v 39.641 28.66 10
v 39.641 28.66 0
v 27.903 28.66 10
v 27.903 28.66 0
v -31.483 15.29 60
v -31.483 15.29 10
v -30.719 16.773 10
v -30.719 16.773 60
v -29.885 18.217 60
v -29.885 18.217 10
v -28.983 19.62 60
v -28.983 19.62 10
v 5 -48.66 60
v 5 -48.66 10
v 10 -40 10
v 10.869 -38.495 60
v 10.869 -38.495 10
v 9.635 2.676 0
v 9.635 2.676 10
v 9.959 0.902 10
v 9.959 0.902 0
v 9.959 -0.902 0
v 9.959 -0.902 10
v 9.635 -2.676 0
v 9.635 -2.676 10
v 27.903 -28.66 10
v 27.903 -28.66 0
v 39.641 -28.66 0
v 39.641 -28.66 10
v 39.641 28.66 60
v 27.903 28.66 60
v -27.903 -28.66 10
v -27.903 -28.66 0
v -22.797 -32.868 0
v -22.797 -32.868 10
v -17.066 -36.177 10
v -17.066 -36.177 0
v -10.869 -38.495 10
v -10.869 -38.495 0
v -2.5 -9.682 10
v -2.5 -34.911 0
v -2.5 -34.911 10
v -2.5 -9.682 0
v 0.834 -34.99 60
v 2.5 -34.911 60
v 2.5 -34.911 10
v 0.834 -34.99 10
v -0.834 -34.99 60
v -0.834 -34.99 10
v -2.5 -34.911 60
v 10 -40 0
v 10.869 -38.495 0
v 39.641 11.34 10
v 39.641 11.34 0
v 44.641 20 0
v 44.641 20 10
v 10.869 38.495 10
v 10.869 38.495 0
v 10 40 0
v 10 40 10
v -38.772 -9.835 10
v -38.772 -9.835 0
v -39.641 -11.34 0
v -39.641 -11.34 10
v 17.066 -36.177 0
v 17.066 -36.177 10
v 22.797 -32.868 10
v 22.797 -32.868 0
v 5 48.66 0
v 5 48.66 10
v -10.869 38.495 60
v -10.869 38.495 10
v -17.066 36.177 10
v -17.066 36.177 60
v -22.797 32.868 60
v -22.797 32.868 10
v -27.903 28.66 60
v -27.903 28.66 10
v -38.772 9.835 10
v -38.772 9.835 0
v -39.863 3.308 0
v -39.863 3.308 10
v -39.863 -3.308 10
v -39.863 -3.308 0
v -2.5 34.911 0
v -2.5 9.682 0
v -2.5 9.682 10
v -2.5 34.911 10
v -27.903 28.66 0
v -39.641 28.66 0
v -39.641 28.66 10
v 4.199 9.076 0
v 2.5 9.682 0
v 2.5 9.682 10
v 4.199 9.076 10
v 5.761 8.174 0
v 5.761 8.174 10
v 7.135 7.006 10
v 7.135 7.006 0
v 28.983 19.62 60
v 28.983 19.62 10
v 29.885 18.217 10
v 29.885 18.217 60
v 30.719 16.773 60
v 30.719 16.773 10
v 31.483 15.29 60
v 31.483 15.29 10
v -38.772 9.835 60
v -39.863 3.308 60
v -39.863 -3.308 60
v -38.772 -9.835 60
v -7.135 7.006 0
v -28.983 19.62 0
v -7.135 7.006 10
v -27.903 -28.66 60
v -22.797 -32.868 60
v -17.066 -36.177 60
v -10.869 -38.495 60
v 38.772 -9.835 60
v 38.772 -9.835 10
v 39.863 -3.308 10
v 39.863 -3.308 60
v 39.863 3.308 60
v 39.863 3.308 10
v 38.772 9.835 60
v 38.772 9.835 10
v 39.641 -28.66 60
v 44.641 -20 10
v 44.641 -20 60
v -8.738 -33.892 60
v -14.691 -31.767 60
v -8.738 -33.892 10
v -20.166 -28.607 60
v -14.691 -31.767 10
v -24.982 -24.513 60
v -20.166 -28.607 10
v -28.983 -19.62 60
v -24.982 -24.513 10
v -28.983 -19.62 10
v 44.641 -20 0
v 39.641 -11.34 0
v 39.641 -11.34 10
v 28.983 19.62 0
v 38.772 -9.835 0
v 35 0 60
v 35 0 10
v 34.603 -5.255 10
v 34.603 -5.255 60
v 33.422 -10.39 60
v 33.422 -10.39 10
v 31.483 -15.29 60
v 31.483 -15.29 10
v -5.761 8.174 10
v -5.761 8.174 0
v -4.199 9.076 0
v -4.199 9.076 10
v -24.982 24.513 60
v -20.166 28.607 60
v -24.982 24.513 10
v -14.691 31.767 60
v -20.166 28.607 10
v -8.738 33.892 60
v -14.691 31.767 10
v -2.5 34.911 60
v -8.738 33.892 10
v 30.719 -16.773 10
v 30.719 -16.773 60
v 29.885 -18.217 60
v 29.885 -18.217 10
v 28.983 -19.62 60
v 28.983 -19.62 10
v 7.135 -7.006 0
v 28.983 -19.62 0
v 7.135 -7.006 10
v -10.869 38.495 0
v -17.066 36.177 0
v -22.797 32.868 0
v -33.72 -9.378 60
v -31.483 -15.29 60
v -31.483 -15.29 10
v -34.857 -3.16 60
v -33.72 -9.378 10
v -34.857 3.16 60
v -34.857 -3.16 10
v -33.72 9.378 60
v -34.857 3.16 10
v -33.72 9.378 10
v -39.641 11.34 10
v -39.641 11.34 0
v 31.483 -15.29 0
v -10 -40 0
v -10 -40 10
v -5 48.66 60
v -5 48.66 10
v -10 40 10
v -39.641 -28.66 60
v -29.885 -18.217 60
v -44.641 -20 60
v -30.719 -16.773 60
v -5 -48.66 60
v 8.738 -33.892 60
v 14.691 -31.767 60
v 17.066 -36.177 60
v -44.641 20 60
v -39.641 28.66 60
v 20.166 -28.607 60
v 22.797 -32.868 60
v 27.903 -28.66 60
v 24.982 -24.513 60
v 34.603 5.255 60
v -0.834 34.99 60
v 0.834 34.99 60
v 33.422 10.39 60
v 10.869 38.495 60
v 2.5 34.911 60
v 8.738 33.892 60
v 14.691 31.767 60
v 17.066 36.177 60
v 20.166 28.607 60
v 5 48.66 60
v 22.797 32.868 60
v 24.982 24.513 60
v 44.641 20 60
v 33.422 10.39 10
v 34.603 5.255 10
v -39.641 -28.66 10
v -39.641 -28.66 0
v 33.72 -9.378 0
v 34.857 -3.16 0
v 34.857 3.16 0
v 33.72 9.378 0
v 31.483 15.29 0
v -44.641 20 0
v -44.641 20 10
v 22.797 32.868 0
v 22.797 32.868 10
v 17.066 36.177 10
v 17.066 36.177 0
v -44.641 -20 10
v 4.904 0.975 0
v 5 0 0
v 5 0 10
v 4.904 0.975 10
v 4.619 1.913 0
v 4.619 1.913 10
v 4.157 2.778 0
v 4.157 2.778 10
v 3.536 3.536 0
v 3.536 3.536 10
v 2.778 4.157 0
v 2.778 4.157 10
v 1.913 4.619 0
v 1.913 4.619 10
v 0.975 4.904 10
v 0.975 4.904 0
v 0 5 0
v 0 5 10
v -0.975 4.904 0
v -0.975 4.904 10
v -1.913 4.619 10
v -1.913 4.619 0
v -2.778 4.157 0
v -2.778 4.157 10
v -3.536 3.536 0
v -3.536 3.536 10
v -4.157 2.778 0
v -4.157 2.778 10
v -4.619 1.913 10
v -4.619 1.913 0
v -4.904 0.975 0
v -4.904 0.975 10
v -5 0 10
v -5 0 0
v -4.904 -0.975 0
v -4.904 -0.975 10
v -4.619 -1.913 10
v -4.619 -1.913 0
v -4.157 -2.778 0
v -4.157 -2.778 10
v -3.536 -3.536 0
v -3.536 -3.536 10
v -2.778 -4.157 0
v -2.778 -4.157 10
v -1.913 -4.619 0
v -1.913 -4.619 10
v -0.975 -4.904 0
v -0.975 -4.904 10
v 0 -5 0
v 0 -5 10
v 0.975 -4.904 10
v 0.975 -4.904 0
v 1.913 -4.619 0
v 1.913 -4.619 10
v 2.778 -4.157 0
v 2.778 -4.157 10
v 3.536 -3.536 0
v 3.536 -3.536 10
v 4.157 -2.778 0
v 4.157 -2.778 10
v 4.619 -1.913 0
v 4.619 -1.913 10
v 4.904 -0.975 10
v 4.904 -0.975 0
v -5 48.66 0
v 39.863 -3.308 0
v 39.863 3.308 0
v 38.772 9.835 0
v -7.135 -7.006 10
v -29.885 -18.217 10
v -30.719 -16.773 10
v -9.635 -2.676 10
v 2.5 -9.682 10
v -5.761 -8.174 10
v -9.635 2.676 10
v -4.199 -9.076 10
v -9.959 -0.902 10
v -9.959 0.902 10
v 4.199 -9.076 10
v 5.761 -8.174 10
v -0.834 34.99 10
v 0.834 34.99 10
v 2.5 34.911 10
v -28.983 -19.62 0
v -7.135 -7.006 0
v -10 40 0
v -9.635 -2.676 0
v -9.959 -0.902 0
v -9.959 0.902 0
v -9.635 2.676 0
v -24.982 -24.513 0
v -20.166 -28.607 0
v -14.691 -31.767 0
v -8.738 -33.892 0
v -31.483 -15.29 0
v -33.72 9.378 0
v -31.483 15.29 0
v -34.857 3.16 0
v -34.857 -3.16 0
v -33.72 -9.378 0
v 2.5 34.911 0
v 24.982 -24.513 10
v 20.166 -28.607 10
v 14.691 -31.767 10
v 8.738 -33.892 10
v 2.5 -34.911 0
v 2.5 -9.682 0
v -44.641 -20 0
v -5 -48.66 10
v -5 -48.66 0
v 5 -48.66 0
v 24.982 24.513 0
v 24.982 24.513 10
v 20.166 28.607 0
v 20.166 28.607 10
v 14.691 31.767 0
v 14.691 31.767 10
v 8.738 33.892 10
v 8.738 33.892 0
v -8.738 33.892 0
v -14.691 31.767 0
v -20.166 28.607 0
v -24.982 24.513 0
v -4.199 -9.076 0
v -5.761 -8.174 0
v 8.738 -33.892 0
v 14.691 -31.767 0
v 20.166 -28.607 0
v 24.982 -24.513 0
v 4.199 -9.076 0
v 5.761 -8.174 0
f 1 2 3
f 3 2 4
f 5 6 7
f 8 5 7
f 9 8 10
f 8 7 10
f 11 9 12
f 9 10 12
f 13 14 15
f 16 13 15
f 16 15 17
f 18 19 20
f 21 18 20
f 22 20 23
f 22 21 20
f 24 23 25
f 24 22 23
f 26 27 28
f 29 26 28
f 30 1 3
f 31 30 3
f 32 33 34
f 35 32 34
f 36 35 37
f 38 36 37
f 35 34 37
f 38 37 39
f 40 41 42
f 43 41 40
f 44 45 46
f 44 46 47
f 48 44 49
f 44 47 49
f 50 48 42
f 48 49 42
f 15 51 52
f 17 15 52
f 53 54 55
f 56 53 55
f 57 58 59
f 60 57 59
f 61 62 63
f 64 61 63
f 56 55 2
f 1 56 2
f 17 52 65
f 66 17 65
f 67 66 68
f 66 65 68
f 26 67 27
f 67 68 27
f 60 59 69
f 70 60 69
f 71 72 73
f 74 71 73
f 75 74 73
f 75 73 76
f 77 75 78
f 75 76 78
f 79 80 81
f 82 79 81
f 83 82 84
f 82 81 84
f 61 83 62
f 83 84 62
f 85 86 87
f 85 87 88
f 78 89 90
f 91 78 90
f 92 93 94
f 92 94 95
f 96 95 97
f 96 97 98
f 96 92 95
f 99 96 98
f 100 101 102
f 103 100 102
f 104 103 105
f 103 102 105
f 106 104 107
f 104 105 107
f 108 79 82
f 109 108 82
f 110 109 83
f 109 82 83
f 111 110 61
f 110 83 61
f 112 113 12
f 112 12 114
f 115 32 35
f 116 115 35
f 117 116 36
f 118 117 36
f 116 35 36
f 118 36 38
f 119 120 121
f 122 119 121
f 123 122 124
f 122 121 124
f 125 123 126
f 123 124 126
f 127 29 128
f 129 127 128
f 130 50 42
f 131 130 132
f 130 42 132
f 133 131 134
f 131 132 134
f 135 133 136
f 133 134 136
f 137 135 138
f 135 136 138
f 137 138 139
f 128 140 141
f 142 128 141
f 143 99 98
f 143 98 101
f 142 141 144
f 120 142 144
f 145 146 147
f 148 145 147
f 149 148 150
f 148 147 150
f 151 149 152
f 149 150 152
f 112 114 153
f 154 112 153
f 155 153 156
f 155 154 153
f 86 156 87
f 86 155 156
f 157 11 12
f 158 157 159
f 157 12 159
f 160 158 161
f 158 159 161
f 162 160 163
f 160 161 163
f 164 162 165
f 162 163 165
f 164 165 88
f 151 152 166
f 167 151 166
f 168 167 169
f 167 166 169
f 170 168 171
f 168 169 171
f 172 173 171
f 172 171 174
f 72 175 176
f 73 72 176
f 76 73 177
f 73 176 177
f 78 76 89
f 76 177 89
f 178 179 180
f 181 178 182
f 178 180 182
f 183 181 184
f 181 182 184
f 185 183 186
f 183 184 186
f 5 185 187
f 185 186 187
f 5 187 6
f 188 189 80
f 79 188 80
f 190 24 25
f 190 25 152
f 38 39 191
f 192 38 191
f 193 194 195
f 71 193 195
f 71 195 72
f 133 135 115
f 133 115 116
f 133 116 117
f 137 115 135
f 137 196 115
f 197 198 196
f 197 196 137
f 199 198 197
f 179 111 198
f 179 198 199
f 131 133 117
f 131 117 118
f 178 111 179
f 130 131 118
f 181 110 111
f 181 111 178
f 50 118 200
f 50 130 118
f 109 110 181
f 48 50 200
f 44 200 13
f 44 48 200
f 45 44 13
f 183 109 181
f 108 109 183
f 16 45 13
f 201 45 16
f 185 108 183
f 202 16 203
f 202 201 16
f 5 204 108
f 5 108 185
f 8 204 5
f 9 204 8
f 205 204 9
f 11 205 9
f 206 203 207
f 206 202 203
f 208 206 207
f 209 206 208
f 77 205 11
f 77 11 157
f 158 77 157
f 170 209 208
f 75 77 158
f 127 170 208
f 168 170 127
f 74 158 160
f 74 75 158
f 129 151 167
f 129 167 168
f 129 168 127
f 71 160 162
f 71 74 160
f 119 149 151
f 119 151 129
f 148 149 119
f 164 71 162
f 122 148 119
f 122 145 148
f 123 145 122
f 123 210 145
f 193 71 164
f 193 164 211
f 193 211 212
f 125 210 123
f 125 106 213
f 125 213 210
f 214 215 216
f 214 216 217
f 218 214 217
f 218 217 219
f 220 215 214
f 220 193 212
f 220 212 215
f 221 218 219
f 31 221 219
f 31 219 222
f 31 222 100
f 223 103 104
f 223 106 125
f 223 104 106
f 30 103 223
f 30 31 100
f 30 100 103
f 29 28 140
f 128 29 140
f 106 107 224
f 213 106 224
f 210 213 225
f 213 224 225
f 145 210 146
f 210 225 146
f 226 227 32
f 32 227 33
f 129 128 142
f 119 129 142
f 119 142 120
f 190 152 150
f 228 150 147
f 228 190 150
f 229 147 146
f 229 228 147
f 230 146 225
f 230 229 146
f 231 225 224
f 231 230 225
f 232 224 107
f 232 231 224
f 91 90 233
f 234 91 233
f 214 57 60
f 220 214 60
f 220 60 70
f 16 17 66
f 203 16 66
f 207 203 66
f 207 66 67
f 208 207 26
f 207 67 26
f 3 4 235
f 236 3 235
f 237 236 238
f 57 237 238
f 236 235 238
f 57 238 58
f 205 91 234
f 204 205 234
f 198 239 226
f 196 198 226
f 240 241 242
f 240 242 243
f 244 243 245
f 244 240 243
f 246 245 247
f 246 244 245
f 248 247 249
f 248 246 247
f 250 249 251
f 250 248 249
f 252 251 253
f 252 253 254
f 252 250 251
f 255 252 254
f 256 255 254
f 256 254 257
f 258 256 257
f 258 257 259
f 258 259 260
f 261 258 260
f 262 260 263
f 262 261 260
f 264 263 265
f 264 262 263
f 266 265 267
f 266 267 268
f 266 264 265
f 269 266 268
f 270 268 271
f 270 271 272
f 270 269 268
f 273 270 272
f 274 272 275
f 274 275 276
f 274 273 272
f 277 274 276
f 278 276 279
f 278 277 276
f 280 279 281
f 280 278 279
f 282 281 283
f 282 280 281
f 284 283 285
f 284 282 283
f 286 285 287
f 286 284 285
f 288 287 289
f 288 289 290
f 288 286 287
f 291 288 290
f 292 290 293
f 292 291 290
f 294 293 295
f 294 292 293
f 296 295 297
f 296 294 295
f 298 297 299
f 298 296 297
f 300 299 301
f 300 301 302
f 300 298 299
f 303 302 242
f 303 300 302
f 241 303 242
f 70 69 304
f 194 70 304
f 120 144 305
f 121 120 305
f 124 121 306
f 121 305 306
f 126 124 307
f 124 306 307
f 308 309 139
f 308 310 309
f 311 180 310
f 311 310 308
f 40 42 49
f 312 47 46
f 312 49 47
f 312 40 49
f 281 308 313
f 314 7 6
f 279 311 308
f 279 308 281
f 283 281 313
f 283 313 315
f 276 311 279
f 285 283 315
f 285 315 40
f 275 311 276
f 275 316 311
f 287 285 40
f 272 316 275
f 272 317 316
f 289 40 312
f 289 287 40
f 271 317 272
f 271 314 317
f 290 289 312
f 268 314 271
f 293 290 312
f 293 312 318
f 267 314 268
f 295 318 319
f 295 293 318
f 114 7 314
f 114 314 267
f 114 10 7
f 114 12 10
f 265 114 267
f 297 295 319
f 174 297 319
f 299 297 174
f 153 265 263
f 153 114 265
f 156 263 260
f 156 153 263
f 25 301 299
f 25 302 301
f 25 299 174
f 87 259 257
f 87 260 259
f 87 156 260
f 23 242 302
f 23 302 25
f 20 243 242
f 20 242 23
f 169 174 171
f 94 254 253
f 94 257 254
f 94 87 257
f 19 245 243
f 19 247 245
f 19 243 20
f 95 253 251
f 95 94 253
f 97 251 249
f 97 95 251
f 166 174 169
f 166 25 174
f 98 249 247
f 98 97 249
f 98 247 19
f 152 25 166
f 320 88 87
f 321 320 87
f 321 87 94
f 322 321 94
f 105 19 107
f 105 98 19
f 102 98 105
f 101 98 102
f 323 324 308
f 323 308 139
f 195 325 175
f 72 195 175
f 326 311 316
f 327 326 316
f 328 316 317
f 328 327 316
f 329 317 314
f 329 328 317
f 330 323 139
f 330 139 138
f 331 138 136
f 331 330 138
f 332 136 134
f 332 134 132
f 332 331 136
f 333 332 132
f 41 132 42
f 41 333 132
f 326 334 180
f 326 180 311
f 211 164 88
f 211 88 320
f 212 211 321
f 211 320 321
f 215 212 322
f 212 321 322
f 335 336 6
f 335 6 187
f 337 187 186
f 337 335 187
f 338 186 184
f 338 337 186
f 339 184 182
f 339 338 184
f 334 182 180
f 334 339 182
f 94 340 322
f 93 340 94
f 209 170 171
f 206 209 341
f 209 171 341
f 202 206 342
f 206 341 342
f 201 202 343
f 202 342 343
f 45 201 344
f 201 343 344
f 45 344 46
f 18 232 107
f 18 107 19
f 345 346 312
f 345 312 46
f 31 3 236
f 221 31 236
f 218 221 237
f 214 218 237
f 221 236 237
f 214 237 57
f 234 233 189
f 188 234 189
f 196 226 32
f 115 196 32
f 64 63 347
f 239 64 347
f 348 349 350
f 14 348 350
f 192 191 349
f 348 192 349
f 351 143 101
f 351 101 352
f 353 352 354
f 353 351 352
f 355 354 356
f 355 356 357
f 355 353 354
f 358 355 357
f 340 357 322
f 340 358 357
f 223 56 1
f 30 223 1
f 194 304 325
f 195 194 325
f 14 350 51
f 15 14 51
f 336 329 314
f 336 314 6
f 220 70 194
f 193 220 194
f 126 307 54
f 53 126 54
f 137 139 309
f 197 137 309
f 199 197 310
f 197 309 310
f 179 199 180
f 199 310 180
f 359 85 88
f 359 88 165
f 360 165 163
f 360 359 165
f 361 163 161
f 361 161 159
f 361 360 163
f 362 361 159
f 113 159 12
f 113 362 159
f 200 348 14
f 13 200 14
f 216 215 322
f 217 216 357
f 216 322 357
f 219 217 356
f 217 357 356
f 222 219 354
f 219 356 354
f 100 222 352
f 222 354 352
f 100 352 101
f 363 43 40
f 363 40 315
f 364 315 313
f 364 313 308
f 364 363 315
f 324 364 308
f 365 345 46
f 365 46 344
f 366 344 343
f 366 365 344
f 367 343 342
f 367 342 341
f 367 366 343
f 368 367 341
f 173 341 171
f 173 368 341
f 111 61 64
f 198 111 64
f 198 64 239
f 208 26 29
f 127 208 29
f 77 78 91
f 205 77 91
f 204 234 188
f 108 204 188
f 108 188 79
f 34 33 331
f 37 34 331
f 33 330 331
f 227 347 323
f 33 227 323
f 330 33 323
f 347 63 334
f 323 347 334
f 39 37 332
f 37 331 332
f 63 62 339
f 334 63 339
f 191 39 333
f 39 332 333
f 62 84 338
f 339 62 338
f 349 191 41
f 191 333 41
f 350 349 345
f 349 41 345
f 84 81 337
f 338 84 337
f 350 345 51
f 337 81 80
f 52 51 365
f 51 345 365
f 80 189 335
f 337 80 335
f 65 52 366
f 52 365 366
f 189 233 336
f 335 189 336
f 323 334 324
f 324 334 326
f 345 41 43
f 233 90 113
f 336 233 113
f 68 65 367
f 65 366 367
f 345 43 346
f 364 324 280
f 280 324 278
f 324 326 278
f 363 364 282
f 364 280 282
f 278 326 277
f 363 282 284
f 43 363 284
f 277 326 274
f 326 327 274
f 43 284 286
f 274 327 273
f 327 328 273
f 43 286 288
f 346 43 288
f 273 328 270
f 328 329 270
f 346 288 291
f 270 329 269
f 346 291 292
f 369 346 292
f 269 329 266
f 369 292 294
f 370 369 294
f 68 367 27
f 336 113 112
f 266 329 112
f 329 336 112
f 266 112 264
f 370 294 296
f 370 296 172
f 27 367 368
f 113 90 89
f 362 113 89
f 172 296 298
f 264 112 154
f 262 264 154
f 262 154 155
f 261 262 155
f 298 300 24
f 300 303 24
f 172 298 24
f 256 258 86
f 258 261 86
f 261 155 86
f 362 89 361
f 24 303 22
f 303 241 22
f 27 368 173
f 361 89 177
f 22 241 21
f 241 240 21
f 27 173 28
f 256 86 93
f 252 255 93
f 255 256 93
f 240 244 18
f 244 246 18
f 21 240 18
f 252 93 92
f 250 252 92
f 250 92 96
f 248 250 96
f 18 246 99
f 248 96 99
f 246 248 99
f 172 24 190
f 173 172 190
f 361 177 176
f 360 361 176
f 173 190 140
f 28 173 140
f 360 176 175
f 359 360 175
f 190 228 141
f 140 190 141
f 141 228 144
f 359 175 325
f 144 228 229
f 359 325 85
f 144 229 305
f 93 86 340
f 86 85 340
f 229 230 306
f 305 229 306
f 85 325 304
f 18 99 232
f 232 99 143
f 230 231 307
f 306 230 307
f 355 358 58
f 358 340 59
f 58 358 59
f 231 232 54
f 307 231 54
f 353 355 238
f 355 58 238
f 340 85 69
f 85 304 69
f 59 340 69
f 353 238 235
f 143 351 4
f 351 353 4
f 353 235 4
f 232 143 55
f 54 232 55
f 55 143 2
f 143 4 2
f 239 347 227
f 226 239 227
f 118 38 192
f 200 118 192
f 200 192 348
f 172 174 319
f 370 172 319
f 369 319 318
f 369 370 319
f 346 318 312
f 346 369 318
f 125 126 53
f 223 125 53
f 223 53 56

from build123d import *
from build123d.topology import SkipClean

# Parameters (mm, degrees)
SKETCH1_R           = 5
BOSS_EXTRUDE1_DEPTH = 10
BOSS_EXTRUDE2_DEPTH = 50


with BuildPart() as part:
    # Sketch1 → Boss-Extrude1 (new body)
    with BuildSketch(Plane.XY):
        with BuildLine():
            Line((-5, 48.660254038), (-10, 40))
            Line((-10, 40), (-10.868896713, 38.495026747))
            ThreePointArc((-10.868896713, 38.495026747), (-20, 34.641016151), (-27.903222726, 28.660254038))
            Line((-27.903222726, 28.660254038), (-29.641016151, 28.660254038))
            Line((-29.641016151, 28.660254038), (-39.641016151, 28.660254038))
            Line((-39.641016151, 28.660254038), (-44.641016151, 20))
            Line((-44.641016151, 20), (-39.641016151, 11.339745962))
            Line((-39.641016151, 11.339745962), (-38.772119439, 9.834772709))
            ThreePointArc((-38.772119439, 9.834772709), (-40, 0), (-38.772119439, -9.834772709))
            Line((-38.772119439, -9.834772709), (-39.641016151, -11.339745962))
            Line((-39.641016151, -11.339745962), (-44.641016151, -20))
            Line((-44.641016151, -20), (-39.641016151, -28.660254038))
            Line((-39.641016151, -28.660254038), (-29.641016151, -28.660254038))
            Line((-29.641016151, -28.660254038), (-27.903222726, -28.660254038))
            ThreePointArc((-27.903222726, -28.660254038), (-20, -34.641016151), (-10.868896713, -38.495026747))
            Line((-10.868896713, -38.495026747), (-10, -40))
            Line((-10, -40), (-5, -48.660254038))
            Line((-5, -48.660254038), (5, -48.660254038))
            Line((5, -48.660254038), (10, -40))
            Line((10, -40), (10.868896713, -38.495026747))
            ThreePointArc((10.868896713, -38.495026747), (20, -34.641016151), (27.903222726, -28.660254038))
            Line((27.903222726, -28.660254038), (29.641016151, -28.660254038))
            Line((29.641016151, -28.660254038), (39.641016151, -28.660254038))
            Line((39.641016151, -28.660254038), (44.641016151, -20))
            Line((44.641016151, -20), (39.641016151, -11.339745962))
            Line((39.641016151, -11.339745962), (38.772119439, -9.834772709))
            ThreePointArc((38.772119439, -9.834772709), (40, 0), (38.772119439, 9.834772709))
            Line((38.772119439, 9.834772709), (39.641016151, 11.339745962))
            Line((39.641016151, 11.339745962), (44.641016151, 20))
            Line((44.641016151, 20), (39.641016151, 28.660254038))
            Line((39.641016151, 28.660254038), (29.641016151, 28.660254038))
            Line((29.641016151, 28.660254038), (27.903222726, 28.660254038))
            ThreePointArc((27.903222726, 28.660254038), (20, 34.641016151), (10.868896713, 38.495026747))
            Line((10.868896713, 38.495026747), (10, 40))
            Line((10, 40), (5, 48.660254038))
            Line((5, 48.660254038), (-5, 48.660254038))
        make_face()
        Circle(SKETCH1_R, mode=Mode.SUBTRACT)
        with BuildLine():
            Line((-2.5, 9.682458366), (-2.5, 34.910600109))
            ThreePointArc((-2.5, 34.910600109), (-17.5, 30.310889132), (-28.983466556, 19.620363564))
            Line((-28.983466556, 19.620363564), (-7.135254916, 7.006292692))
            ThreePointArc((-7.135254916, 7.006292692), (-5, 8.660254038), (-2.5, 9.682458366))
        make_face(mode=Mode.SUBTRACT)
        with BuildLine():
            Line((2.5, 34.910600109), (2.5, 9.682458366))
            ThreePointArc((2.5, 9.682458366), (5, 8.660254038), (7.135254916, 7.006292692))
            Line((7.135254916, 7.006292692), (28.983466556, 19.620363564))
            ThreePointArc((28.983466556, 19.620363564), (17.5, 30.310889132), (2.5, 34.910600109))
        make_face(mode=Mode.SUBTRACT)
        with BuildLine():
            Line((31.483466556, 15.290236545), (9.635254916, 2.676165673))
            ThreePointArc((9.635254916, 2.676165673), (10, 0), (9.635254916, -2.676165673))
            Line((9.635254916, -2.676165673), (31.483466556, -15.290236545))
            ThreePointArc((31.483466556, -15.290236545), (35, 0), (31.483466556, 15.290236545))
        make_face(mode=Mode.SUBTRACT)
        with BuildLine():
            Line((28.983466556, -19.620363564), (7.135254916, -7.006292692))
            ThreePointArc((7.135254916, -7.006292692), (5, -8.660254038), (2.5, -9.682458366))
            Line((2.5, -9.682458366), (2.5, -34.910600109))
            ThreePointArc((2.5, -34.910600109), (17.5, -30.310889132), (28.983466556, -19.620363564))
        make_face(mode=Mode.SUBTRACT)
        with BuildLine():
            Line((-2.5, -34.910600109), (-2.5, -9.682458366))
            ThreePointArc((-2.5, -9.682458366), (-5, -8.660254038), (-7.135254916, -7.006292692))
            Line((-7.135254916, -7.006292692), (-28.983466556, -19.620363564))
            ThreePointArc((-28.983466556, -19.620363564), (-17.5, -30.310889132), (-2.5, -34.910600109))
        make_face(mode=Mode.SUBTRACT)
        with BuildLine():
            Line((-31.483466556, -15.290236545), (-9.635254916, -2.676165673))
            ThreePointArc((-9.635254916, -2.676165673), (-10, 0), (-9.635254916, 2.676165673))
            Line((-9.635254916, 2.676165673), (-31.483466556, 15.290236545))
            ThreePointArc((-31.483466556, 15.290236545), (-35, 0), (-31.483466556, -15.290236545))
        make_face(mode=Mode.SUBTRACT)
    extrude(amount=BOSS_EXTRUDE1_DEPTH)

    # Sketch2 → Boss-Extrude2 (add)
    with SkipClean():  # the faces are left unmerged after this step: merging them gives an invalid solid
        with BuildSketch(Plane.XY.offset(10)):
            with BuildLine():
                Line((-44.641016151, 20), (-38.772119439, 9.834772709))
                ThreePointArc((-38.772119439, 9.834772709), (-40, 0), (-38.772119439, -9.834772709))
                Line((-38.772119439, -9.834772709), (-44.641016151, -20))
                Line((-44.641016151, -20), (-39.641016151, -28.660254038))
                Line((-39.641016151, -28.660254038), (-27.903222726, -28.660254038))
                ThreePointArc((-27.903222726, -28.660254038), (-20, -34.641016151), (-10.868896713, -38.495026747))
                Line((-10.868896713, -38.495026747), (-5, -48.660254038))
                Line((-5, -48.660254038), (5, -48.660254038))
                Line((5, -48.660254038), (10.868896713, -38.495026747))
                ThreePointArc((10.868896713, -38.495026747), (20, -34.641016151), (27.903222726, -28.660254038))
                Line((27.903222726, -28.660254038), (39.641016151, -28.660254038))
                Line((39.641016151, -28.660254038), (44.641016151, -20))
                Line((44.641016151, -20), (38.772119439, -9.834772709))
                ThreePointArc((38.772119439, -9.834772709), (40, 0), (38.772119439, 9.834772709))
                Line((38.772119439, 9.834772709), (44.641016151, 20))
                Line((44.641016151, 20), (39.641016151, 28.660254038))
                Line((39.641016151, 28.660254038), (27.903222726, 28.660254038))
                ThreePointArc((27.903222726, 28.660254038), (20, 34.641016151), (10.868896713, 38.495026747))
                Line((10.868896713, 38.495026747), (5, 48.660254038))
                Line((5, 48.660254038), (-5, 48.660254038))
                Line((-5, 48.660254038), (-10.868896713, 38.495026747))
                ThreePointArc((-10.868896713, 38.495026747), (-20, 34.641016151), (-27.903222726, 28.660254038))
                Line((-27.903222726, 28.660254038), (-39.641016151, 28.660254038))
                Line((-39.641016151, 28.660254038), (-44.641016151, 20))
            make_face()
            with BuildLine():
                ThreePointArc((31.483466556, 15.290236545), (34.109539204, 7.844701095), (35, 0))
                ThreePointArc((35, 0), (34.109539204, -7.844701095), (31.483466556, -15.290236545))
                ThreePointArc((31.483466556, -15.290236545), (30.310889132, -17.5), (28.983466556, -19.620363564))
                ThreePointArc((28.983466556, -19.620363564), (17.5, -30.310889132), (2.5, -34.910600109))
                ThreePointArc((2.5, -34.910600109), (0, -35), (-2.5, -34.910600109))
                ThreePointArc((-2.5, -34.910600109), (-17.5, -30.310889132), (-28.983466556, -19.620363564))
                ThreePointArc((-28.983466556, -19.620363564), (-30.310889132, -17.5), (-31.483466556, -15.290236545))
                ThreePointArc((-31.483466556, -15.290236545), (-35, 0), (-31.483466556, 15.290236545))
                ThreePointArc((-31.483466556, 15.290236545), (-30.310889132, 17.5), (-28.983466556, 19.620363564))
                ThreePointArc((-28.983466556, 19.620363564), (-17.5, 30.310889132), (-2.5, 34.910600109))
                ThreePointArc((-2.5, 34.910600109), (0, 35), (2.5, 34.910600109))
                ThreePointArc((2.5, 34.910600109), (17.5, 30.310889132), (28.983466556, 19.620363564))
                ThreePointArc((28.983466556, 19.620363564), (30.310889132, 17.5), (31.483466556, 15.290236545))
            make_face(mode=Mode.SUBTRACT)
        extrude(amount=BOSS_EXTRUDE2_DEPTH)


solid = part.part
